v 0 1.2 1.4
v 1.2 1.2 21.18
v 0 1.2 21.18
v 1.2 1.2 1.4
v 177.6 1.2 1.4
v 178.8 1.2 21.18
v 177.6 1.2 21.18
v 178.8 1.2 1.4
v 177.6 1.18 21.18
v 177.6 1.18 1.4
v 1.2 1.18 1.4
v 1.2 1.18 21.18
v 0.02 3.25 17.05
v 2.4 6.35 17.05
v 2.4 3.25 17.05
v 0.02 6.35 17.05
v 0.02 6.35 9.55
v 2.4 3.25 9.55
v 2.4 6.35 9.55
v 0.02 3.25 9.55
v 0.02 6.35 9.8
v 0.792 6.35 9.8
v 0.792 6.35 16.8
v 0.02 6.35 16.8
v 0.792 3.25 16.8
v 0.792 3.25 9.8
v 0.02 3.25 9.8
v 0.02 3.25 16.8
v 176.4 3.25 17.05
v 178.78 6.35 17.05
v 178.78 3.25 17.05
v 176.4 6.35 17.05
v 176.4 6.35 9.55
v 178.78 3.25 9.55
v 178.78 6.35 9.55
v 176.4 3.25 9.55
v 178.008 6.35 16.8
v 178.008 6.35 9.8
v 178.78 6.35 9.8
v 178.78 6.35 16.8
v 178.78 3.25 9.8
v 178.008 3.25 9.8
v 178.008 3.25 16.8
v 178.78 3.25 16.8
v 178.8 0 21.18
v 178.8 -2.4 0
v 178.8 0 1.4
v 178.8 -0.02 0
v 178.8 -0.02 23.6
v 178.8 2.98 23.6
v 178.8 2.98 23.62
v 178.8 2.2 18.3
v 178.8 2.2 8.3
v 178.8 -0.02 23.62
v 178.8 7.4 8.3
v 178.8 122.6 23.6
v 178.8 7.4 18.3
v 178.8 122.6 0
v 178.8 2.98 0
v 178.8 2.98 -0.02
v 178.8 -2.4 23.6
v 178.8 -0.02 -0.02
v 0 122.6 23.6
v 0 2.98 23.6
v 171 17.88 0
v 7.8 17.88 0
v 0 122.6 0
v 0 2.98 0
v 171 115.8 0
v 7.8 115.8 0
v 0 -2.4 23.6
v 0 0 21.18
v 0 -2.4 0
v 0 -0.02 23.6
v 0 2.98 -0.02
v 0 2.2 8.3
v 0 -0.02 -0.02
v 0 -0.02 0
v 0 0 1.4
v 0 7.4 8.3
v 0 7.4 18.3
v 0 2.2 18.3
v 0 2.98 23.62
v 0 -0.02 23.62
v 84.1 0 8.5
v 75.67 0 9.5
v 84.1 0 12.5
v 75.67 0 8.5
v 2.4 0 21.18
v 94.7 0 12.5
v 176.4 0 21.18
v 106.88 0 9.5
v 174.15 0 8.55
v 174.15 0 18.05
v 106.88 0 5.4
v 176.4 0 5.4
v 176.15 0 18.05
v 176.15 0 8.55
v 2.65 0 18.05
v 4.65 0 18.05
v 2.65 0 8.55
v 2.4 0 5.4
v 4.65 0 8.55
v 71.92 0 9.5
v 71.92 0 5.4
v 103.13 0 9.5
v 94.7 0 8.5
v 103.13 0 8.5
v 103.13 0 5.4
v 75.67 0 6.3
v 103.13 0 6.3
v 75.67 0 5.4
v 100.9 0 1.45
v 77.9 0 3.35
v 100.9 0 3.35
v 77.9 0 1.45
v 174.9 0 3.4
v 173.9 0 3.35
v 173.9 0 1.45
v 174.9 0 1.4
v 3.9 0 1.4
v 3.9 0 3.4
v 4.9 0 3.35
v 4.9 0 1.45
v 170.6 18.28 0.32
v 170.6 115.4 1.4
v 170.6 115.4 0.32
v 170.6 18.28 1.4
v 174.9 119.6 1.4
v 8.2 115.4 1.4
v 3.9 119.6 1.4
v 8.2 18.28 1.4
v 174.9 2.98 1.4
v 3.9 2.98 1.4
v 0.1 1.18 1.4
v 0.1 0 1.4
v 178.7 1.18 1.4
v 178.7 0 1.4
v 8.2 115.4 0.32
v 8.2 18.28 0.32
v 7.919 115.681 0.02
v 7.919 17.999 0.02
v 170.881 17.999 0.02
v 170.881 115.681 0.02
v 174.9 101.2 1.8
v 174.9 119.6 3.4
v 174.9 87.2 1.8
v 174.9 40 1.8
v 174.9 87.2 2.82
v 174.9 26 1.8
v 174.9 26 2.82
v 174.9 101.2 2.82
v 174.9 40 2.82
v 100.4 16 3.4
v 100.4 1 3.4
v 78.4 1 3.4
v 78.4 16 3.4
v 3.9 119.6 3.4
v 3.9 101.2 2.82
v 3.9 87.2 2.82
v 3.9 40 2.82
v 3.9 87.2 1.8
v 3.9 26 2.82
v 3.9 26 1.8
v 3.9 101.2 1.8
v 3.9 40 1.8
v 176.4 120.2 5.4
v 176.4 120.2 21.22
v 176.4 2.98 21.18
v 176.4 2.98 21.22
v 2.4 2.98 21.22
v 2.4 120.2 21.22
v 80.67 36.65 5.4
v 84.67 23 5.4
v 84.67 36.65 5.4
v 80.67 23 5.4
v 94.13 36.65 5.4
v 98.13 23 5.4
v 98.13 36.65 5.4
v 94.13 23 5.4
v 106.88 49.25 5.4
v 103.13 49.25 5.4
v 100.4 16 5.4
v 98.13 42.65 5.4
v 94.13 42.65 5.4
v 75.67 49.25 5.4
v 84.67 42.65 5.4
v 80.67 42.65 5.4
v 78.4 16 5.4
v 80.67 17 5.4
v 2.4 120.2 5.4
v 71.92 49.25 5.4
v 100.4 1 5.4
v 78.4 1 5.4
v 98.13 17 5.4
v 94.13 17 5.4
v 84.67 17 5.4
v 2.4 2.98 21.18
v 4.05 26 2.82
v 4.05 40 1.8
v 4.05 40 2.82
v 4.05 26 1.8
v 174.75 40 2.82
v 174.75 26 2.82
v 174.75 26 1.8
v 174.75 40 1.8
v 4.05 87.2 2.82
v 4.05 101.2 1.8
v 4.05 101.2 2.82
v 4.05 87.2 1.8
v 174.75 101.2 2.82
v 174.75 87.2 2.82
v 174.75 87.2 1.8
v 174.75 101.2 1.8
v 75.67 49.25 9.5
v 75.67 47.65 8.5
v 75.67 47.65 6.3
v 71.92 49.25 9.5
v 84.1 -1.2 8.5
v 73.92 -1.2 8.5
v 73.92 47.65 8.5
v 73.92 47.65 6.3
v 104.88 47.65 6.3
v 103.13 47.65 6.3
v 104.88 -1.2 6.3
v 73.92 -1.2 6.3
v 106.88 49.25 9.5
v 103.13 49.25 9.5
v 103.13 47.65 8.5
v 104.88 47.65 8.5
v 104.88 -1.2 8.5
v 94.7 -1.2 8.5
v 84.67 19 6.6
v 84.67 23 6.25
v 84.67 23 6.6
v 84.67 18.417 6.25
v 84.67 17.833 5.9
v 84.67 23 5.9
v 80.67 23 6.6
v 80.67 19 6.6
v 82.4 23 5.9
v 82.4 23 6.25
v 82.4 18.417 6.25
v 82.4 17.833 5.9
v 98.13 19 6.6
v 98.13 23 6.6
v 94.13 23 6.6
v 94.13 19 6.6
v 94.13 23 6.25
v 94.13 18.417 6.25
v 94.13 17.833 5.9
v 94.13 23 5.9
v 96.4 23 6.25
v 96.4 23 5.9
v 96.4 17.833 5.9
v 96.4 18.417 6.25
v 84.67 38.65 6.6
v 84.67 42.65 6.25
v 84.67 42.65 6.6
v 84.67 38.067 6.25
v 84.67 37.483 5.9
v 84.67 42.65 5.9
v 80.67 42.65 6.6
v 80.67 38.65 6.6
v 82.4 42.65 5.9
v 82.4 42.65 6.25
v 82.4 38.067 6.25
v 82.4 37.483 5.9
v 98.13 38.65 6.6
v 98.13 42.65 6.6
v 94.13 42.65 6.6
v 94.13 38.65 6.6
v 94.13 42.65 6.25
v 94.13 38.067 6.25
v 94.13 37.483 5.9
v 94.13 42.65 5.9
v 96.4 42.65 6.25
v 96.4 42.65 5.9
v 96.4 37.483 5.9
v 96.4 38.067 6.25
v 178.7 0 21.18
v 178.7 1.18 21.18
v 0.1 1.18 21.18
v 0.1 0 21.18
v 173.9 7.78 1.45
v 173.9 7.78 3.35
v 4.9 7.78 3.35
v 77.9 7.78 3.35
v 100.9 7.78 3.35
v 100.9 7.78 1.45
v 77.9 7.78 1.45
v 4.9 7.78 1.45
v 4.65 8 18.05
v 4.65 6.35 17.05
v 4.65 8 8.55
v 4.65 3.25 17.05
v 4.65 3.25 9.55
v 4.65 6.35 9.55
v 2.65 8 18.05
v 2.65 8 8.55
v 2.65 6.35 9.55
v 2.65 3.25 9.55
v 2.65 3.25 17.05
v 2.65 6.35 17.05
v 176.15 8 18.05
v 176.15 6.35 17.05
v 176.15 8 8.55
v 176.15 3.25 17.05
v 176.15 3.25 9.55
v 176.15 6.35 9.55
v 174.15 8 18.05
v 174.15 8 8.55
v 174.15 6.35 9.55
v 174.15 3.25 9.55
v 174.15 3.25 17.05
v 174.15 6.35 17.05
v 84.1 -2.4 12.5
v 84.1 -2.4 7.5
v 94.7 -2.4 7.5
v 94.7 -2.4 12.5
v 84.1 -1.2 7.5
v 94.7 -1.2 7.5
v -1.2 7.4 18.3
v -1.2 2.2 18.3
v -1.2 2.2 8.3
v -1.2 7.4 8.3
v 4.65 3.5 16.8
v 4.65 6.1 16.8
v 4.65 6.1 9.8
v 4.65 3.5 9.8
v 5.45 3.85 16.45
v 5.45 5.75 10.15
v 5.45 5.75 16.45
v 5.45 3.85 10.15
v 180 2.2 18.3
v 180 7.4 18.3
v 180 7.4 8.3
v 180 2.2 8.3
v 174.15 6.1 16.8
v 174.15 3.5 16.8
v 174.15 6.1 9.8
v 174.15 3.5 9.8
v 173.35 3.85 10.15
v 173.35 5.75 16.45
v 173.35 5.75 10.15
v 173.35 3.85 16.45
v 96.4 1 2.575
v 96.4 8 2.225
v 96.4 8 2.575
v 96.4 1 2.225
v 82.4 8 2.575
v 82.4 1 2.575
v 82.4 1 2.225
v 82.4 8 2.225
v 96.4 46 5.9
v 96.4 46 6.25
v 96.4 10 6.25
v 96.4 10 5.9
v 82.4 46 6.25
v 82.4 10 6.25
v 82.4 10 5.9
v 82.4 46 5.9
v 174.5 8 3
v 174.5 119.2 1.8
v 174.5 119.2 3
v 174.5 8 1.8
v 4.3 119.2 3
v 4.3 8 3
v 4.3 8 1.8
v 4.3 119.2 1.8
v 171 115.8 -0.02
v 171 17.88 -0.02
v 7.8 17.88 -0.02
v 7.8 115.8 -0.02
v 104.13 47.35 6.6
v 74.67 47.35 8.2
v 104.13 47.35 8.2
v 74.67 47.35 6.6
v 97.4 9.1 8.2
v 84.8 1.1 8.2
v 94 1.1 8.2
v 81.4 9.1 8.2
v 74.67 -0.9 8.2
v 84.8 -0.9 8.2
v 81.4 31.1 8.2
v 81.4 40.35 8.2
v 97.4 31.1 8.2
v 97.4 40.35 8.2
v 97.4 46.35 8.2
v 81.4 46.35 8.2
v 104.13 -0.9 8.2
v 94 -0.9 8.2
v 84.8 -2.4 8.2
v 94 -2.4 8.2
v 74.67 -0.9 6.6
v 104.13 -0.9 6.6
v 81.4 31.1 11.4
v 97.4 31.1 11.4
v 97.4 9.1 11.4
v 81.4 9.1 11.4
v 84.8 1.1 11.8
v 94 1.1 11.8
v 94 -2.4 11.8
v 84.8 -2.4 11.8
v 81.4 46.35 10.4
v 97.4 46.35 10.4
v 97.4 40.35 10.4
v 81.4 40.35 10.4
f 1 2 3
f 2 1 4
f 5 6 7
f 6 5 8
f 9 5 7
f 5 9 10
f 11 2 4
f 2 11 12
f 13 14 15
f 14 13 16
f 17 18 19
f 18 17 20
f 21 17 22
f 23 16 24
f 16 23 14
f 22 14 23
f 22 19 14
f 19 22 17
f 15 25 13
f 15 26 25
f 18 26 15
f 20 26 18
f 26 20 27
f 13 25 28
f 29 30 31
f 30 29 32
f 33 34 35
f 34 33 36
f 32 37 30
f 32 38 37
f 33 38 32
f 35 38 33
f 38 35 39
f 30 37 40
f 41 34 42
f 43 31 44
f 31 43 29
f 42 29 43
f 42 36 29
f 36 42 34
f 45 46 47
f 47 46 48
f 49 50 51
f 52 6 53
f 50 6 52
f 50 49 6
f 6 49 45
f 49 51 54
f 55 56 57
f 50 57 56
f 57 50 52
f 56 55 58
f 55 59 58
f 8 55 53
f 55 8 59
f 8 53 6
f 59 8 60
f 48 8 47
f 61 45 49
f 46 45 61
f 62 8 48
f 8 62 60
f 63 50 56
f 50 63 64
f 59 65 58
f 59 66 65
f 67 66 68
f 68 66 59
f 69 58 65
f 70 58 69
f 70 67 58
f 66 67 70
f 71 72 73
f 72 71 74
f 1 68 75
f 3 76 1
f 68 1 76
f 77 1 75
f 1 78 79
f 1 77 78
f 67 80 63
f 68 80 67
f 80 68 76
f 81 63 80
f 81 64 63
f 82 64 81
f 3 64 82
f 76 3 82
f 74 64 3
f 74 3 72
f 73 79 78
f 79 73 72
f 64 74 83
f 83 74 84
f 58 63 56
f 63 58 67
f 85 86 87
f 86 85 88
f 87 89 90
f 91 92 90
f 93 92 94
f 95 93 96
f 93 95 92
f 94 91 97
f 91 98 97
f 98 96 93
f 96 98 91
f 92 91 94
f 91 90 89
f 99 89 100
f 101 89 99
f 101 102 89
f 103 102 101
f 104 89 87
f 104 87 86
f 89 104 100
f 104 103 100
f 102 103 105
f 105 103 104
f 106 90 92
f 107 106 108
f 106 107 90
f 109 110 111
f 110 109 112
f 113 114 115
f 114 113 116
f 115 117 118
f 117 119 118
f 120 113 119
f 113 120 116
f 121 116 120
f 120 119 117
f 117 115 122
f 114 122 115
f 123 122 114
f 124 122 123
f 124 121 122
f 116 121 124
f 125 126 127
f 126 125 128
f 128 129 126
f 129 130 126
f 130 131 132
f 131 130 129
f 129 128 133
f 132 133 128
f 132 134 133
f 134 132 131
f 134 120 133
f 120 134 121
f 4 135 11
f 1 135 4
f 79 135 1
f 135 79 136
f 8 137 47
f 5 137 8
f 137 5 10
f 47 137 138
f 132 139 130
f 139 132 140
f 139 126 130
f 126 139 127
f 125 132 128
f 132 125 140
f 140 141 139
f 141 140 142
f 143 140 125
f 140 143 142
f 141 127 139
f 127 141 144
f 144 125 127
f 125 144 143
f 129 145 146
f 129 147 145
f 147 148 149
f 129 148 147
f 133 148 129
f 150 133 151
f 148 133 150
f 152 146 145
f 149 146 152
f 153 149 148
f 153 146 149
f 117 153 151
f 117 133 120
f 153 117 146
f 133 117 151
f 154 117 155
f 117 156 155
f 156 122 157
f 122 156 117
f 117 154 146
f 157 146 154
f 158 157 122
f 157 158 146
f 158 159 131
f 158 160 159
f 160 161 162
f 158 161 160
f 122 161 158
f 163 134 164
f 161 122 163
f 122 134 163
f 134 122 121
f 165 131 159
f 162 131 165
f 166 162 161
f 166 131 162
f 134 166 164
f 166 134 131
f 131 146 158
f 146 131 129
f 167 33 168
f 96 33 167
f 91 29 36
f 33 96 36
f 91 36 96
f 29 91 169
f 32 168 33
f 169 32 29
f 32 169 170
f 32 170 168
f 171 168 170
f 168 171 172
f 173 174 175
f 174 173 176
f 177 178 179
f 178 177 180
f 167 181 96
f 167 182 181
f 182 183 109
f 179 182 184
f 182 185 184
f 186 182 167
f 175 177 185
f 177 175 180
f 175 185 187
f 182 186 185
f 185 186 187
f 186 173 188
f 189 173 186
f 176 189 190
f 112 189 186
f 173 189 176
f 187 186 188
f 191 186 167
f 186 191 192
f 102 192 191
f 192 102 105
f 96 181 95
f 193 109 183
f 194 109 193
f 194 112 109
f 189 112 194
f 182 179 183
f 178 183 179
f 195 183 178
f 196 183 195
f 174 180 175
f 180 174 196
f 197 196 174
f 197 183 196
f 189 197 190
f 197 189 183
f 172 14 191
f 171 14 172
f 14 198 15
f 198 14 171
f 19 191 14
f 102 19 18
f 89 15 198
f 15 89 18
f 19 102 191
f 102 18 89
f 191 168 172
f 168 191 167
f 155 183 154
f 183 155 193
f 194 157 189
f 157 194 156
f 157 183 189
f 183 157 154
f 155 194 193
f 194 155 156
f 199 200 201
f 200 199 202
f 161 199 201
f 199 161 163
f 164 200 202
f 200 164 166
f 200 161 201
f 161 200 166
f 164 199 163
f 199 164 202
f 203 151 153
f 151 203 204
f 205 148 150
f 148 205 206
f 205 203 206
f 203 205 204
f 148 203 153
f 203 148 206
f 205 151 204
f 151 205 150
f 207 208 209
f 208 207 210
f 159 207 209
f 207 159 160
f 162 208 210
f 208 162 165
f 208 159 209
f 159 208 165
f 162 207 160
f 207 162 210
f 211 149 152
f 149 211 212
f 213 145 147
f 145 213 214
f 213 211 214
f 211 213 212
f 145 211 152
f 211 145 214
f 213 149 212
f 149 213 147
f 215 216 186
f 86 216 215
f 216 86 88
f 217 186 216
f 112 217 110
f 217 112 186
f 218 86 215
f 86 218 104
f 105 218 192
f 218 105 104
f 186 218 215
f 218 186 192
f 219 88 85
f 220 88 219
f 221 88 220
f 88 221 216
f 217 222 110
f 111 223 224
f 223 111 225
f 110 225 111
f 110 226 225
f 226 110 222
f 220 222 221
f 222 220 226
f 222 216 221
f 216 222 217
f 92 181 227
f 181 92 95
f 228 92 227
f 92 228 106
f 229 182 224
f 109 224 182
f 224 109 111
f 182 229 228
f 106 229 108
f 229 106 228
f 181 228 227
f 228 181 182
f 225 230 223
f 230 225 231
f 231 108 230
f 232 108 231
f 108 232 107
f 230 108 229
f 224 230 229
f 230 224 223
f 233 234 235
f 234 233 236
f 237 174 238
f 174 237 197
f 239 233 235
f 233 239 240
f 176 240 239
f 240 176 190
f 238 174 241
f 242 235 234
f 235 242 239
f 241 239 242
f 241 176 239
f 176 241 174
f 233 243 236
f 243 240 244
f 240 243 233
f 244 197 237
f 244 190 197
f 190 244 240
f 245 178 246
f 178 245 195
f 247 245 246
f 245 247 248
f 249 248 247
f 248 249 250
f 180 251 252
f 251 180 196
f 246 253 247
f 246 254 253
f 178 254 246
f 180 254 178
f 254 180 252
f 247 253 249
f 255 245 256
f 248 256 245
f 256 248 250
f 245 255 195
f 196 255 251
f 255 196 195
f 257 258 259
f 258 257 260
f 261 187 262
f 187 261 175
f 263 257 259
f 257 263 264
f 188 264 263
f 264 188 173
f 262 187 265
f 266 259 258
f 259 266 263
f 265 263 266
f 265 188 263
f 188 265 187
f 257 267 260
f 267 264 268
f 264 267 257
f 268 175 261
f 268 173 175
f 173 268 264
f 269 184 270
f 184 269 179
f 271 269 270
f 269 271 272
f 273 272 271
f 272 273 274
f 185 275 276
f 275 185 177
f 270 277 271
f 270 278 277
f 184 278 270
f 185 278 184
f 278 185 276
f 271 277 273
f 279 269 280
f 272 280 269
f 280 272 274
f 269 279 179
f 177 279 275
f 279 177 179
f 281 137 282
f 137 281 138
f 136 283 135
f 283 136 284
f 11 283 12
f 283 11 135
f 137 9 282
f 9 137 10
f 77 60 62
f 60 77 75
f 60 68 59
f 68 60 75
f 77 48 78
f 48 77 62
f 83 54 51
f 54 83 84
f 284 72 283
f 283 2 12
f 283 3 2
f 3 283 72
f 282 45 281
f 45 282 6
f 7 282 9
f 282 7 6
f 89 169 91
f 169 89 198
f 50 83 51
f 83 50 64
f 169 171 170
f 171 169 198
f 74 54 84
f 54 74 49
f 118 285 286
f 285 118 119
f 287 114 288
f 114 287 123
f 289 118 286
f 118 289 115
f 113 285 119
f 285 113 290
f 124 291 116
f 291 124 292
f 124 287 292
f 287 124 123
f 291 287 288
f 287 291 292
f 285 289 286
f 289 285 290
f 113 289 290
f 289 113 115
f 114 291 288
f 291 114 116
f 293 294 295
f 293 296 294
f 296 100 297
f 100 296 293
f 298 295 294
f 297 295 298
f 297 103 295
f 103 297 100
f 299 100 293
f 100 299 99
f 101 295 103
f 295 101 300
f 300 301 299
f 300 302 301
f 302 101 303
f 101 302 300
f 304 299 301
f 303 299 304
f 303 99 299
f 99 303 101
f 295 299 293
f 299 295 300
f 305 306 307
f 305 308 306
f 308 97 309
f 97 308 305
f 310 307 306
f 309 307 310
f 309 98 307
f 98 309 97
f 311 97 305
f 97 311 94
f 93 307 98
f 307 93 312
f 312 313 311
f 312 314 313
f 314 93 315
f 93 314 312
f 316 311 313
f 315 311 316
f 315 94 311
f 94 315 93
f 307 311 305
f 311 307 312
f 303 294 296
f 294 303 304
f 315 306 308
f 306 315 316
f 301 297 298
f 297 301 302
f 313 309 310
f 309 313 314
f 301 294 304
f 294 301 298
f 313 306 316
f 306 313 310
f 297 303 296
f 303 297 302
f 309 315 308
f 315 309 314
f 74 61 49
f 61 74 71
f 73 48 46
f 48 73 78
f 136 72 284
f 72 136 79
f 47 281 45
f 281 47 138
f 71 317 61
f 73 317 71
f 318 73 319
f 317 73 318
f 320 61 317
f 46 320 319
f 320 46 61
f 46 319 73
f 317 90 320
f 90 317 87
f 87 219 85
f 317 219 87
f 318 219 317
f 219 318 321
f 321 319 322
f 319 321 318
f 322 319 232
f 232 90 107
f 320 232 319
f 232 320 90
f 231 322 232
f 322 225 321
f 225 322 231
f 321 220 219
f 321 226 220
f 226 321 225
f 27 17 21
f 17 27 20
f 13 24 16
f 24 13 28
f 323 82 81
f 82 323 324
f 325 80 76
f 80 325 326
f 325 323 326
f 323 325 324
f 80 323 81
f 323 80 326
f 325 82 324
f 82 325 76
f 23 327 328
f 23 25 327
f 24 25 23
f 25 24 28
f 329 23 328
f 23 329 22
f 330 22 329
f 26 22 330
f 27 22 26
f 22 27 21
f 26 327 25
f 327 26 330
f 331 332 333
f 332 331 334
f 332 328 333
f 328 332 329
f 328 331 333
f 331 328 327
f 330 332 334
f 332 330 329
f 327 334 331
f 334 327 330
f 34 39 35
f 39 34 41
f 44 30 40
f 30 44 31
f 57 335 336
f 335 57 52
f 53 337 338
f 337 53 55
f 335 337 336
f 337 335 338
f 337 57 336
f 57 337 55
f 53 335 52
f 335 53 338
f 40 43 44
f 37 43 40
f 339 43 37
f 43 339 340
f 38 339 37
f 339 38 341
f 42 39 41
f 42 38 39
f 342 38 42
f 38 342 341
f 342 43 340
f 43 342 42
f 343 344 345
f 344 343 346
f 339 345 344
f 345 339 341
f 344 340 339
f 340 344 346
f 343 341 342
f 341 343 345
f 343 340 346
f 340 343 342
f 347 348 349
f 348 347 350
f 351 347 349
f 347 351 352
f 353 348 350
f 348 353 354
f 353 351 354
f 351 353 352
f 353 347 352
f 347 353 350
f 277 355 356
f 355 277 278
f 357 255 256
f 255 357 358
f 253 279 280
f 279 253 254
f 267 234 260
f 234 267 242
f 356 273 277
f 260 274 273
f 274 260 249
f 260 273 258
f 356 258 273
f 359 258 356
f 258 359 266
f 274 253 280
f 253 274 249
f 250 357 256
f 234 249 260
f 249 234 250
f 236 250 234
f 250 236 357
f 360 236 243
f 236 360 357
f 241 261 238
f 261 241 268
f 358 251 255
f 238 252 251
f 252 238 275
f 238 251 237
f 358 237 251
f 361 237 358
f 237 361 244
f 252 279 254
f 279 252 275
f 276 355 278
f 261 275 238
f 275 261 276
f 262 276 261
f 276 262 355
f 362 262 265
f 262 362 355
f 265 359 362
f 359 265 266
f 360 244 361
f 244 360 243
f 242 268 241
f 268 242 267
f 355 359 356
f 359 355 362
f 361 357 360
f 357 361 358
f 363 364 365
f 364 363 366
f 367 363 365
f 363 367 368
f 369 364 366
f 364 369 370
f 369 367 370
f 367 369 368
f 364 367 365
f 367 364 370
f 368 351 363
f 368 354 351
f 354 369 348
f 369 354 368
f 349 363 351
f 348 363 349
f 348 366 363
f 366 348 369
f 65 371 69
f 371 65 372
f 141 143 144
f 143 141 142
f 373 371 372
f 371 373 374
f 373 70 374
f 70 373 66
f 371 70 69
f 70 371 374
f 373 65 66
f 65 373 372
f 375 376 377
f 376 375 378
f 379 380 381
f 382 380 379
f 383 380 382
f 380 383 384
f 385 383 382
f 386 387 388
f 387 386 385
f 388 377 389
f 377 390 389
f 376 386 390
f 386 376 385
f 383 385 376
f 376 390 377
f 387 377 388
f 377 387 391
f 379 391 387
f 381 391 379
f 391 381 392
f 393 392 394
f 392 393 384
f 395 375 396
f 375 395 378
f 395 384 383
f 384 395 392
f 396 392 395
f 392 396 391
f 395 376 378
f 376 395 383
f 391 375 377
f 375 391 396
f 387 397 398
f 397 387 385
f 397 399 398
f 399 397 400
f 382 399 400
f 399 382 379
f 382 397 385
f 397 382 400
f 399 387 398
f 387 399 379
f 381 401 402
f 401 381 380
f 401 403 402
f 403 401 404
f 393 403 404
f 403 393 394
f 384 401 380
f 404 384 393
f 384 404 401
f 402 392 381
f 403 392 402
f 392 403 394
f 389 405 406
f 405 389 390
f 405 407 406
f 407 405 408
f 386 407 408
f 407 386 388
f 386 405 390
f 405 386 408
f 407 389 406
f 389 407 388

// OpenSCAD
// Waveshare 7.5" e-Paper + ESP32 Driver Board case
//
// Devices:
//   - Waveshare 7.5inch e-Paper raw panel (ASIN B075R69T93)
//     outline 170.2 x 111.2 x 1.2 mm, AA 163.2 x 97.92, 24-pin FPC
//   - Waveshare e-Paper ESP32 Driver Board (ASIN B07M5CNP3B)
//     29.46 x 48.25 mm, USB-C (2024+). No mounting holes.
//
// TWO printable parts — see LEARNINGS.md and tools/fdm-design-rules.md:
//   shell — U-slot + window + backer + bay; print CLOSED-END down (slide open up)
//   cap   — closes FPC end, retains panel; print outer face down
//
// Principle: the panel groove is a U-channel extruded in the print Z
// (slide direction). Every layer is self-supporting — the backer is a
// vertical wall, not a bridge over the window.
//
// Assembly: slide panel into shell from FPC end → connect ribbon → slide the
// board ZIF-end-first into straight rails → seat cap → insert two rigid keys.
//
// Fasteners:
//   Cap→shell: two rigid printed side keys (PLA-safe; no flex, no screws)
//   Board:     none (straight slide-in cradle; cap retains it)
//
// Assembly coords: X right, Y up (FPC at Y=0), Z toward back.
// Print (shell): closed end (Y=max) on bed, FPC end open at top.

/* [Parts] */
part = "assembled"; // [assembled, shell, cap, key] Which object to show / export
show_components = true; // Ghost panel + board in assembled preview
explode = 0;            // [0:0.5:40] Part separation for assembly views (mm)

/* [Panel — Waveshare 7.5" raw] */
panel_w = 170.2;             // [160:0.1:180] Panel outline width (mm)
panel_h = 111.2;             // [100:0.1:120] Panel outline height (mm)
panel_t = 1.20;              // [0.8:0.05:2] Panel thickness (mm)
active_w = 163.2;            // [150:0.1:170] Active area width (mm)
active_h = 97.92;            // [90:0.01:110] Active area height (mm)
bezel_left = 3.5;            // [2:0.1:8] Left outline→AA bezel (mm)
bezel_right = 3.5;           // [2:0.1:8] Right outline→AA bezel (mm)
bezel_top = 3.40;            // [2:0.1:8] Bezel opposite the FPC edge (mm)

/* [FPC / SPI ribbon] */
fpc_w = 14.0;                // [10:0.5:20] FPC width allowance (mm)
fpc_t = 0.35;                // [0.2:0.05:0.6] FPC thickness (mm)
fpc_fold_bay = 8.0;          // [4:0.5:14] Internal bay at FPC end before cap (mm)
fpc_channel_w = 22.0;        // [14:1:40] Ribbon pass into board bay (mm)

/* [ESP32 driver board] */
board_w = 29.46;             // [25:0.01:40] Board short axis (mm)
board_l = 48.25;             // [40:0.01:60] Board long axis, USB↔ZIF (mm)
board_t = 1.60;              // [1.2:0.1:2.4] PCB thickness (mm)
board_comp_h = 8.0;          // [5:0.5:15] Component clearance above PCB (mm)
usb_w = 9.2;                 // [8:0.1:12] USB-C shell width (mm)
usb_h = 3.6;                 // [3:0.1:5] USB-C shell height (mm)
usb_protrude = 1.5;          // [0.5:0.1:3] USB shell past PCB edge (mm)
usb_face = 0.0;              // [0:0.1:2] USB recess from cap outer face (mm)
usb_cut_clear = 0.7;         // [0.3:0.1:1.5] USB cutout clearance (mm)
board_pocket_clear = 0.75;   // [0.4:0.05:1.2] PCB edge/rail clearance (mm)
board_z_clear = 0.30;        // [0.15:0.05:0.6] PCB thickness clearance (mm)
board_edge_capture = 1.0;    // [0.6:0.1:1.5] PCB edge held by each rail (mm)
board_end_clear = 0.30;      // [0.1:0.05:0.8] End play between cap/stop (mm)

/* [Case geometry] */
wall = 2.4;                  // [1.5:0.1:4] Outer wall thickness (mm)
panel_clear = 0.40;          // [0.2:0.05:0.8] Slot clearance around panel (mm)
panel_crush = 0.15;          // [0:0.05:0.4] Crush-rib intrusion in slot (mm)
front_lip_t = 1.4;           // [1.0:0.1:2.5] Front window-lip thickness (mm)
backer_t = 2.0;              // [1.5:0.1:3] Panel backer wall thickness (mm)
rear_bay_extra = 3.0;        // [1:0.5:8] Extra bay air (mm)
cap_t = 2.4;                 // [1.5:0.1:4] Cap thickness along slide axis (mm)
cap_rabbet = 1.2;            // [0.6:0.1:2.5] Cap lip into shell mouth (mm)
cap_skirt = 3.0;             // [1.5:0.5:6] Cap return flange over front/back (mm)
side_rim = 1.5;              // [1.2:0.1:8] Rim outside panel L/R (mm)
closed_end_wall = 3.0;       // [2:0.1:8] Wall opposite FPC / print bed (mm)

/* [Cap locks — rigid printed keys; PLA-safe, no bending] */
lock_tongue_t = 2.0;         // [1.5:0.1:3] Cap side-tongue thickness (mm)
lock_reach = 8.0;            // [6:0.5:12] Tongue reach into shell (mm)
lock_key_y = 2.6;            // [2:0.1:4] Key shear thickness along case Y (mm)
lock_key_z = 7.0;            // [5:0.5:10] Key body height (mm)
lock_key_clear = 0.25;       // [0.15:0.05:0.5] Key/slot clearance (mm)
lock_wedge = 0.10;           // [0:0.05:0.3] Full-seat wedge interference (mm)
lock_head_t = 1.2;           // [0.8:0.1:2] Side pull-tab projection (mm)
lock_head_y = 5.2;           // [4:0.2:8] Pull-tab width (mm)
lock_head_z = 10.0;          // [8:0.5:14] Pull-tab height (mm)
lock_tip = 0.8;              // [0.4:0.1:1.5] Insertion lead-in length (mm)

/* [USB exit] */
usb_exit = "cap";            // [cap] USB-C exits through removable cap

/* [FDM — elephant-foot relief] */
elephant_chamfer = 0.3;      // [0:0.1:1.5] Bed-face outer chamfer (mm)
window_elephant_chamfer = 0.3; // [0:0.1:1] Window-edge relief on front lip (mm)

/* [Tolerances / print] */
$fn = 48;                    // [16:8:96] Circle segments
eps = 0.02;                  // Boolean overlap fudge (mm)

// ---------------------------------------------------------------------------
// Derived — assembly frame (X right, Y up / FPC at 0, Z toward back)
// ---------------------------------------------------------------------------
bezel_fpc = panel_h - active_h - bezel_top;

slot_t = panel_t + 2 * panel_clear;
// Standoff = printable bead height (≤~1.2 mm fat walls off the backer).
board_standoff = 1.2;
bay_need = board_standoff + board_t + board_comp_h + 2.0;
bay_d = max(bay_need, 12.0) + rear_bay_extra;

z_lip1 = front_lip_t;
z_slot0 = z_lip1;
z_slot1 = z_slot0 + slot_t;
z_backer0 = z_slot1;
z_backer1 = z_backer0 + backer_t;
z_bay0 = z_backer1;
z_bay1 = z_bay0 + bay_d;
case_depth = z_bay1 + wall;

y_open = 0;
y_panel0 = fpc_fold_bay;
y_panel1 = y_panel0 + panel_h;
case_h = y_panel1 + panel_clear + closed_end_wall;

case_w = panel_w + 2 * panel_clear + 2 * side_rim + 2 * wall;
panel_x0 = wall + side_rim + panel_clear;
active_x0 = panel_x0 + bezel_left;
active_y0 = y_panel0 + bezel_fpc;

window_inset = 0.4;
window_x0 = active_x0 + window_inset;
window_y0 = active_y0 + window_inset;
window_w = active_w - 2 * window_inset;
window_h = active_h - 2 * window_inset;

fpc_pass_x0 = panel_x0 + (panel_w - fpc_channel_w) / 2;
fpc_pass_y0 = y_open + 1;
fpc_pass_y1 = y_panel0 + 8;

board_pose = board_placement();
board_x0 = board_pose[0];
board_y0 = board_pose[1];
board_rot = board_pose[2];
board_z0 = z_bay0 + board_standoff;

lock_key_center_y = 4.8;
lock_key_center_z = z_bay0 + bay_d / 2;
lock_key_body_l = wall + lock_key_clear + lock_tongue_t + 0.8;

assert(panel_clear > panel_crush,
       "panel_clear must exceed panel_crush so the glass can slide");
assert(case_w <= 180,
       "Default shell must fit the Bambu A1 Mini's 180 mm X dimension");
assert(lock_key_center_y + lock_key_y / 2 + lock_key_clear < lock_reach,
       "Rigid key slot must remain inside the cap lock tongue");

echo("============================================================");
echo(str("CLOSED OVERALL: ", case_w, " x ", case_h + cap_t, " x ", case_depth, " mm"));
echo("Printable geometries: 3  (shell + cap + key; print 2 keys)");
echo("Print shell: CLOSED-END down, FPC slide-open UP (U-slot extruded in Z)");
echo("Print cap:   outer face down (flat; USB opening only)");
echo(str("Slot: clear=", panel_clear, " crush=", panel_crush,
         " effective rib clearance/side=", panel_clear - panel_crush));
echo(str("FPC: fold bay ", fpc_fold_bay, " mm; internal backer pass (no external hole)"));
echo(str("Cap retention: 2× rigid printed keys; clearance=", lock_key_clear,
         " mm; wedge=", lock_wedge, " mm (PLA-safe, no flex)"));
echo(str("Board: ZIF-end-first straight slide; edge clear=", board_pocket_clear,
         " mm; thickness clear=", board_z_clear, " mm"));
echo(str("USB: cap opening ", usb_w + 2 * usb_cut_clear, " x ",
         usb_h + 2 * usb_cut_clear, " mm; face recess=", usb_face, " mm"));
echo(str("Board standoff: ", board_standoff, " mm; rails fused to backer"));
echo(str("Elephant-foot chamfer: ", elephant_chamfer, " mm"));
echo("See LEARNINGS.md — U-slot print-upward principle");
echo("============================================================");

// Board rotates so its long axis follows the shell's insertion direction.
// The ZIF end leads into two straight grooves; USB remains at the cap mouth.
// Local -X (USB) maps to world -Y (the removable-cap end).
function board_placement() =
    [
        case_w / 2 + board_w / 2,
        -cap_t + usb_face + usb_protrude,
        90
    ];

function board_size_xy() =
    [board_w, board_l];

function board_footprint() =
    [board_x0 - board_w, board_y0, board_w, board_l];

// ---------------------------------------------------------------------------
// Helpers
// ---------------------------------------------------------------------------
module rounded_rect(w, h, r) {
    rr = min(r, w / 2 - eps, h / 2 - eps);
    if (rr <= 0) square([w, h]);
    else translate([rr, rr]) offset(r = rr) square([w - 2 * rr, h - 2 * rr]);
}

module bottom_outer_chamfer_cut(w, h, r, ch) {
    if (ch > 0)
        difference() {
            translate([-eps, -eps, -eps])
                cube([w + 2 * eps, h + 2 * eps, ch + eps]);
            hull() {
                translate([0, 0, ch])
                    linear_extrude(height = eps)
                        rounded_rect(w, h, r);
                translate([ch, ch, -eps])
                    linear_extrude(height = eps)
                        rounded_rect(
                            max(eps, w - 2 * ch),
                            max(eps, h - 2 * ch),
                            max(0.01, r - ch)
                        );
            }
        }
}

module at_board() {
    translate([board_x0, board_y0, board_z0])
        rotate([0, 0, board_rot])
            children();
}

// ---------------------------------------------------------------------------
// Ghosts
// ---------------------------------------------------------------------------
module panel_ghost() {
    color("Ivory", 0.9)
        translate([panel_x0, y_panel0, z_slot0 + panel_clear])
            cube([panel_w, panel_h, panel_t]);
    color("#4a4a4a", 0.75)
        translate([active_x0, active_y0, -0.02])
            cube([active_w, active_h, 0.04]);
    color("#c9a227", 0.95) {
        translate([
            panel_x0 + (panel_w - fpc_w) / 2,
            y_open + 1,
            z_slot0 + panel_clear + panel_t / 2 - fpc_t / 2
        ])
            cube([fpc_w, y_panel0 + 2, fpc_t]);
        translate([
            panel_x0 + (panel_w - fpc_w) / 2,
            y_panel0 + 2,
            z_bay0 + 0.5
        ])
            cube([fpc_w, 36, fpc_t]);
    }
}

module board_ghost() {
    at_board() {
        color("#1b5e20", 0.92) cube([board_l, board_w, board_t]);
        color("#111111", 0.9)
            translate([10, (board_w - 16) / 2, board_t]) cube([22, 16, 3.2]);
        color("#b0b0b0", 0.95)
            translate([-usb_protrude, (board_w - usb_w) / 2, board_t])
                cube([usb_protrude + 2, usb_w, usb_h]);
        color("#222222", 0.9)
            translate([board_l - 7, (board_w - 16) / 2, board_t])
                cube([6, 16, 2.2]);
    }
}

module cap_usb_cutouts() {
    // USB tunnel through the cap at final display resolution / placement.
    cw = usb_w + 2 * usb_cut_clear;
    ch = usb_h + 2 * usb_cut_clear;
    at_board()
        translate([
            -usb_protrude - usb_face - eps,
            (board_w - cw) / 2,
            board_t - usb_cut_clear
        ])
            cube([
                usb_protrude + usb_face + cap_t + 4,
                cw,
                ch
            ]);

    // The PCB's USB edge sits partly inside the cap. Recess only the cap's
    // inner face; the outer face remains solid except for the USB tunnel.
    fp = board_footprint();
    bx = fp[0];
    by = fp[1];
    bw = fp[2];
    relief_y0 = min(by - board_end_clear, -eps);
    translate([
        bx - board_pocket_clear,
        relief_y0,
        board_z0 - board_z_clear
    ])
        cube([
            bw + 2 * board_pocket_clear,
            -relief_y0 + eps,
            board_t + 2 * board_z_clear
        ]);
}

// ---------------------------------------------------------------------------
// PLA-safe cap locks — two rigid printed keys, no cantilever flex
// ---------------------------------------------------------------------------
module shell_lock_slots() {
    hole_y = lock_key_y + 2 * lock_key_clear;
    hole_z = lock_key_z + 2 * lock_key_clear;
    for (x = [-eps, case_w - wall - eps])
        translate([
            x,
            lock_key_center_y - hole_y / 2,
            lock_key_center_z - hole_z / 2
        ])
            cube([wall + 2 * eps, hole_y, hole_z]);
}

module cap_lock_tongues() {
    tongue_z0 =
        lock_key_center_z - lock_key_z / 2 - lock_key_clear - 1.0;
    tongue_h = lock_key_z + 2 * lock_key_clear + 2.0;
    difference() {
        union() {
            translate([
                wall + lock_key_clear,
                -eps,
                tongue_z0
            ])
                cube([lock_tongue_t, lock_reach + eps, tongue_h]);
            translate([
                case_w - wall - lock_key_clear - lock_tongue_t,
                -eps,
                tongue_z0
            ])
                cube([lock_tongue_t, lock_reach + eps, tongue_h]);
        }
        translate([
            -eps,
            lock_key_center_y - lock_key_y / 2 - lock_key_clear,
            lock_key_center_z - lock_key_z / 2 - lock_key_clear
        ])
            cube([
                case_w + 2 * eps,
                lock_key_y + 2 * lock_key_clear,
                lock_key_z + 2 * lock_key_clear
            ]);
    }
}

module lock_key() {
    body_end = lock_key_body_l - lock_tip;
    seated_y =
        lock_key_y + 2 * lock_key_clear + lock_wedge;
    union() {
        // Pull tab remains on the side of the case, not its standing end.
        translate([
            -lock_head_t,
            -lock_head_y / 2,
            -lock_head_z / 2
        ])
            cube([
                lock_head_t + eps,
                lock_head_y,
                lock_head_z
            ]);

        // Shallow self-locking wedge: easy lead-in, then 0.10 mm nominal
        // interference at full seat. The whole wall/tongue pair takes the
        // tiny compliance; there is no thin PLA flexure to snap.
        hull() {
            translate([
                0,
                -seated_y / 2,
                -lock_key_z / 2
            ])
                cube([eps, seated_y, lock_key_z]);
            translate([
                body_end - eps,
                -lock_key_y / 2,
                -lock_key_z / 2
            ])
                cube([eps, lock_key_y, lock_key_z]);
        }

        // Rigid lead-in taper; insertion requires no bending.
        hull() {
            translate([
                body_end - eps,
                -lock_key_y / 2,
                -lock_key_z / 2
            ])
                cube([eps, lock_key_y, lock_key_z]);
            translate([
                lock_key_body_l - eps,
                -lock_key_y / 2 + 0.35,
                -lock_key_z / 2 + 0.35
            ])
                cube([
                    eps,
                    lock_key_y - 0.7,
                    lock_key_z - 0.7
                ]);
        }
    }
}

module lock_key_at(side, pull = 0) {
    if (side < 0)
        translate([
            -pull,
            lock_key_center_y,
            lock_key_center_z
        ])
            lock_key();
    else
        translate([
            case_w + pull,
            lock_key_center_y,
            lock_key_center_z
        ])
            mirror([1, 0, 0])
                lock_key();
}

module lock_key_print() {
    // Largest head face on bed; rigid body grows upward.
    translate([
        lock_head_z / 2,
        lock_head_y / 2,
        lock_head_t
    ])
        rotate([0, -90, 0])
            lock_key();
}

// ---------------------------------------------------------------------------
// Shell
// ---------------------------------------------------------------------------
module shell() {
    difference() {
        cube([case_w, case_h, case_depth]);

        // Window through front lip
        translate([window_x0, window_y0, -eps])
            cube([window_w, window_h, z_slot0 + eps]);

        if (window_elephant_chamfer > 0)
            hull() {
                translate([
                    window_x0 - window_elephant_chamfer,
                    window_y0 - window_elephant_chamfer,
                    -eps
                ])
                    cube([
                        window_w + 2 * window_elephant_chamfer,
                        window_h + 2 * window_elephant_chamfer,
                        eps
                    ]);
                translate([window_x0, window_y0, window_elephant_chamfer])
                    cube([window_w, window_h, eps]);
            }

        // U-slot (panel groove) — open at FPC end, stopped by closed-end wall.
        // Front lip stays SOLID through the fold-bay strip so the front never
        // shows bay innards; the panel end-loads under the continuous lip.
        translate([
            panel_x0 - panel_clear,
            y_open - eps,
            z_slot0
        ])
            cube([
                panel_w + 2 * panel_clear,
                y_panel1 + panel_clear - y_open + eps,
                slot_t
            ]);

        // Electronics bay
        translate([wall, wall, z_bay0])
            cube([case_w - 2 * wall, case_h - 2 * wall, bay_d + eps]);

        // Bay access through the open-end wall (board + ribbon during assembly).
        // Fully covered by the cap plug when closed — not a front-face hole.
        translate([wall, y_open - eps, z_bay0])
            cube([case_w - 2 * wall, wall + 2 * eps, bay_d + eps]);

        // Perimeter rabbet on the open-end face for the cap lip (hides seam)
        if (cap_rabbet > 0)
            difference() {
                translate([-eps, y_open - eps, -eps])
                    cube([case_w + 2 * eps, cap_rabbet + eps, case_depth + 2 * eps]);
                translate([cap_rabbet, y_open - 2 * eps, cap_rabbet])
                    cube([
                        case_w - 2 * cap_rabbet,
                        cap_rabbet + 3 * eps,
                        case_depth - 2 * cap_rabbet
                    ]);
            }

        // Internal ribbon pass through backer into bay
        translate([
            fpc_pass_x0,
            fpc_pass_y0,
            z_backer0 - eps
        ])
            cube([
                fpc_channel_w,
                fpc_pass_y1 - fpc_pass_y0,
                backer_t + 2 * eps
            ]);

        shell_lock_slots();
    }

    // Crush ribs in the slot (vertical beads along print Z after reorient)
    if (panel_crush > 0) {
        rib_len = 14;
        rib_z = z_slot0 + panel_clear;
        rib_h = panel_t * 0.85;
        for (yy = [y_panel0 + 18, y_panel0 + panel_h - 18 - rib_len]) {
            translate([panel_x0 - panel_clear - 0.15, yy, rib_z])
                cube([panel_crush + 0.15, rib_len, rib_h]);
            translate([
                panel_x0 + panel_w + panel_clear - panel_crush,
                yy, rib_z
            ])
                cube([panel_crush + 0.15, rib_len, rib_h]);
        }
    }

    board_cradle();
}

module board_cradle() {
    // Two straight U-rails point at the open end. The board goes in ZIF-end
    // first; no tilt or sideways move is required. In shell print orientation
    // these constant cross-sections grow vertically and need no supports.
    fp = board_footprint();
    bx = fp[0];
    by = fp[1];
    bw = fp[2];
    bh = fp[3];
    t = 2.0;
    clear = board_pocket_clear;
    capture = board_edge_capture;
    stop_t = 1.6;
    stop_y = by + bh + board_end_clear;
    rail_z0 = z_bay0 - eps;
    groove_z0 = board_z0 - board_z_clear;
    groove_h = board_t + 2 * board_z_clear;
    rail_z1 = groove_z0 + groove_h + 1.0;
    rail_h = rail_z1 - rail_z0;

    // Left rail: groove opens toward +X.
    difference() {
        translate([
            bx - clear - t,
            y_open,
            rail_z0
        ])
            cube([
                t + clear + capture,
                stop_y + stop_t,
                rail_h
            ]);
        translate([
            bx - clear,
            y_open - eps,
            groove_z0
        ])
            cube([
                clear + capture + eps,
                stop_y + eps,
                groove_h
            ]);
    }

    // Right rail: groove opens toward -X.
    difference() {
        translate([
            bx + bw - capture,
            y_open,
            rail_z0
        ])
            cube([
                capture + clear + t,
                stop_y + stop_t,
                rail_h
            ]);
        translate([
            bx + bw - capture - eps,
            y_open - eps,
            groove_z0
        ])
            cube([
                capture + clear + eps,
                stop_y + eps,
                groove_h
            ]);
    }

    // Four low pads set the PCB plane. Their 45° leading ramps prevent the
    // ZIF edge catching while the board slides inward.
    // Keep the first pair beyond fpc_pass_y1; a pad over that backer cutout
    // would be a disconnected island.
    for (yy = [fpc_pass_y1 + 3, stop_y - 9])
        for (xx = [bx + 6, bx + bw - 10])
            union() {
                translate([xx, yy, z_bay0 - eps])
                    cube([4, 4, board_standoff + eps]);
                hull() {
                    translate([xx, yy - 2, z_bay0 - eps])
                        cube([4, eps, eps]);
                    translate([xx, yy, z_bay0 - eps])
                        cube([4, eps, board_standoff + eps]);
                }
            }
}

module shell_print() {
    // Closed end on bed, FPC mouth up — U-slot extruded in print Z
    translate([0, 0, case_h])
        rotate([-90, 0, 0])
            difference() {
                shell();
                if (elephant_chamfer > 0)
                    translate([0, case_h + eps, 0])
                        rotate([90, 0, 0])
                            bottom_outer_chamfer_cut(
                                case_w, case_depth, 0.01, elephant_chamfer
                            );
            }
}

// ---------------------------------------------------------------------------
// Cap
// ---------------------------------------------------------------------------
module cap() {
    difference() {
        union() {
            // Full end plate: flat standing face, except the USB opening.
            translate([0, -cap_t, 0])
                cube([case_w, cap_t, case_depth]);

            // Perimeter lip into the shell rabbet (tight visual seam)
            if (cap_rabbet > 0)
                difference() {
                    translate([0.1, -eps, 0.1])
                        cube([
                            case_w - 0.2,
                            cap_rabbet,
                            case_depth - 0.2
                        ]);
                    translate([
                        cap_rabbet + 0.05,
                        -2 * eps,
                        cap_rabbet + 0.05
                    ])
                        cube([
                            case_w - 2 * cap_rabbet - 0.1,
                            cap_rabbet + 3 * eps,
                            case_depth - 2 * cap_rabbet - 0.1
                        ]);
                }

            // Return skirts hide the seam from front and back.
            if (cap_skirt > 0) {
                translate([0, -eps, -0.02])
                    cube([
                        case_w,
                        cap_skirt,
                        front_lip_t + 0.02
                    ]);
                translate([
                    0,
                    -eps,
                    case_depth - wall - 0.02
                ])
                    cube([
                        case_w,
                        cap_skirt,
                        wall + 0.04
                    ]);
            }

            // Retention tongue butts the panel's FPC edge. Center notch leaves
            // the ribbon route clear.
            tongue_len = y_panel0 - 0.2;
            difference() {
                translate([
                    panel_x0 - panel_clear + 1,
                    -eps,
                    z_slot0 + 0.05
                ])
                    cube([
                        panel_w + 2 * panel_clear - 2,
                        tongue_len,
                        slot_t - 0.1
                    ]);
                translate([
                    fpc_pass_x0 - 0.5,
                    -2 * eps,
                    z_slot0 - eps
                ])
                    cube([
                        fpc_channel_w + 1,
                        tongue_len + 3 * eps,
                        slot_t + 2 * eps
                    ]);
            }

            cap_lock_tongues();
        }

        // USB and the shallow PCB-edge recess are both in the removable cap,
        // so the board follows a straight insertion path in the shell.
        cap_usb_cutouts();
    }
}

module cap_print() {
    // Outer face (y = -cap_t) on bed; thickness builds in +Z.
    // Rx(90): (x,y,z) -> (x,-z,y). Shift y by +cap_t first so outer → y=0 → z_print=0.
    translate([0, case_depth, 0])
        rotate([90, 0, 0])
            translate([0, cap_t, 0])
                difference() {
                    cap();
                    if (elephant_chamfer > 0)
                        translate([0, -cap_t - eps, 0])
                            rotate([-90, 0, 0])
                                bottom_outer_chamfer_cut(
                                    case_w, case_depth, 0.01, elephant_chamfer
                                );
                }
}

// ---------------------------------------------------------------------------
// Assembly
// ---------------------------------------------------------------------------
module assembled() {
    color("#3d5a80")
        shell();

    translate([0, -explode, 0])
        color("#293241")
            cap();

    color("#ee6c4d") {
        lock_key_at(-1, explode * 0.2);
        lock_key_at(+1, explode * 0.2);
    }

    if (show_components) {
        translate([0, -explode * 0.35, 0])
            panel_ghost();
        translate([0, -explode * 0.15, 0])
            board_ghost();
    }
}

if (part == "assembled")
    assembled();
else if (part == "shell")
    shell_print();
else if (part == "cap")
    cap_print();
else if (part == "key")
    lock_key_print();
else if (part == "bezel" || part == "tray" || part == "front")
    shell_print(); // legacy aliases
else if (part == "back")
    cap_print();
